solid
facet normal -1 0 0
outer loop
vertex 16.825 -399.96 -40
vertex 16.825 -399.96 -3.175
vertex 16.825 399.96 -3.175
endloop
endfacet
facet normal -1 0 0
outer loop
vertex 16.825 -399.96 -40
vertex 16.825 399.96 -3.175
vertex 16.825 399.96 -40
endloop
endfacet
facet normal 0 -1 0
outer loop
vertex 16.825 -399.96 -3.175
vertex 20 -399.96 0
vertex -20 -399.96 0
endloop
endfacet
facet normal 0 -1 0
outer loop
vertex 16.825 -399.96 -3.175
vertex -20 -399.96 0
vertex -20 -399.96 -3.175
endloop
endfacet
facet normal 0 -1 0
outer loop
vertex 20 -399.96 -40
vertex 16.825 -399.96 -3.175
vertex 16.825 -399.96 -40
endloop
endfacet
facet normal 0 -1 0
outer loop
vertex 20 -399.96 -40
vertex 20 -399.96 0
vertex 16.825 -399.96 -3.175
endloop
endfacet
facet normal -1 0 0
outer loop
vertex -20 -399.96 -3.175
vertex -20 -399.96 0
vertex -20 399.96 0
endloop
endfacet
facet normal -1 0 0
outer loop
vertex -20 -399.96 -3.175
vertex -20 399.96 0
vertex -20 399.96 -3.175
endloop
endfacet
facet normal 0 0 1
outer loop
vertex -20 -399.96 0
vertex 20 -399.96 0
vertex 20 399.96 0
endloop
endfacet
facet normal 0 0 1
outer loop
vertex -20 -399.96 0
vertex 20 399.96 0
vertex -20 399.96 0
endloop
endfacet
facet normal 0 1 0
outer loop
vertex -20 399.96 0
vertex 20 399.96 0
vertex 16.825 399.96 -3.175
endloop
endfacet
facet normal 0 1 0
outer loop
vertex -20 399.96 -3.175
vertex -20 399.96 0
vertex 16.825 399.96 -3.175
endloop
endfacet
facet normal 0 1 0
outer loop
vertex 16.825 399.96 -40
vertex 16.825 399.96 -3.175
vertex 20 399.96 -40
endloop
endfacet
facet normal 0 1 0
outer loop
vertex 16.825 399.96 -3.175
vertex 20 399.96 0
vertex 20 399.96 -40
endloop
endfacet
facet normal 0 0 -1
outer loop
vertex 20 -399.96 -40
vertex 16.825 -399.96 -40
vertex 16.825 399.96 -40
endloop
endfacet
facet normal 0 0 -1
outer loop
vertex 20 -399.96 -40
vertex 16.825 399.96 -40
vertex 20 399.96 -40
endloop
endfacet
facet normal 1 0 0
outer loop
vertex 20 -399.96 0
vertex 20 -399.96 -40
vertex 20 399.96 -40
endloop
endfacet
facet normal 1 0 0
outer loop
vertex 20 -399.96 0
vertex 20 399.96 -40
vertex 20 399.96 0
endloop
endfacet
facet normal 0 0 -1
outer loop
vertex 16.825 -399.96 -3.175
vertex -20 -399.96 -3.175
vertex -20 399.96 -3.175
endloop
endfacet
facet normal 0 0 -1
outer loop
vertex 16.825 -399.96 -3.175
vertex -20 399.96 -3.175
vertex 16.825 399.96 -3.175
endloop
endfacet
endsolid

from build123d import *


with BuildPart() as f2:
    # F2: sweep along a path in F0
    with BuildLine(Plane.XY) as f2_path:
        Line((0, 399.9603311834), (0, -399.9603311834))
    # F1 (on Front) → F2 (sweep)
    with BuildSketch(Plane.XZ):
        Polygon((20, -40), (20, 0), (-20, 0), (-20, -3.175), (16.825, -3.175), (16.825, -40), align=None)
    sweep(path=f2_path.line)


solid = f2.part
